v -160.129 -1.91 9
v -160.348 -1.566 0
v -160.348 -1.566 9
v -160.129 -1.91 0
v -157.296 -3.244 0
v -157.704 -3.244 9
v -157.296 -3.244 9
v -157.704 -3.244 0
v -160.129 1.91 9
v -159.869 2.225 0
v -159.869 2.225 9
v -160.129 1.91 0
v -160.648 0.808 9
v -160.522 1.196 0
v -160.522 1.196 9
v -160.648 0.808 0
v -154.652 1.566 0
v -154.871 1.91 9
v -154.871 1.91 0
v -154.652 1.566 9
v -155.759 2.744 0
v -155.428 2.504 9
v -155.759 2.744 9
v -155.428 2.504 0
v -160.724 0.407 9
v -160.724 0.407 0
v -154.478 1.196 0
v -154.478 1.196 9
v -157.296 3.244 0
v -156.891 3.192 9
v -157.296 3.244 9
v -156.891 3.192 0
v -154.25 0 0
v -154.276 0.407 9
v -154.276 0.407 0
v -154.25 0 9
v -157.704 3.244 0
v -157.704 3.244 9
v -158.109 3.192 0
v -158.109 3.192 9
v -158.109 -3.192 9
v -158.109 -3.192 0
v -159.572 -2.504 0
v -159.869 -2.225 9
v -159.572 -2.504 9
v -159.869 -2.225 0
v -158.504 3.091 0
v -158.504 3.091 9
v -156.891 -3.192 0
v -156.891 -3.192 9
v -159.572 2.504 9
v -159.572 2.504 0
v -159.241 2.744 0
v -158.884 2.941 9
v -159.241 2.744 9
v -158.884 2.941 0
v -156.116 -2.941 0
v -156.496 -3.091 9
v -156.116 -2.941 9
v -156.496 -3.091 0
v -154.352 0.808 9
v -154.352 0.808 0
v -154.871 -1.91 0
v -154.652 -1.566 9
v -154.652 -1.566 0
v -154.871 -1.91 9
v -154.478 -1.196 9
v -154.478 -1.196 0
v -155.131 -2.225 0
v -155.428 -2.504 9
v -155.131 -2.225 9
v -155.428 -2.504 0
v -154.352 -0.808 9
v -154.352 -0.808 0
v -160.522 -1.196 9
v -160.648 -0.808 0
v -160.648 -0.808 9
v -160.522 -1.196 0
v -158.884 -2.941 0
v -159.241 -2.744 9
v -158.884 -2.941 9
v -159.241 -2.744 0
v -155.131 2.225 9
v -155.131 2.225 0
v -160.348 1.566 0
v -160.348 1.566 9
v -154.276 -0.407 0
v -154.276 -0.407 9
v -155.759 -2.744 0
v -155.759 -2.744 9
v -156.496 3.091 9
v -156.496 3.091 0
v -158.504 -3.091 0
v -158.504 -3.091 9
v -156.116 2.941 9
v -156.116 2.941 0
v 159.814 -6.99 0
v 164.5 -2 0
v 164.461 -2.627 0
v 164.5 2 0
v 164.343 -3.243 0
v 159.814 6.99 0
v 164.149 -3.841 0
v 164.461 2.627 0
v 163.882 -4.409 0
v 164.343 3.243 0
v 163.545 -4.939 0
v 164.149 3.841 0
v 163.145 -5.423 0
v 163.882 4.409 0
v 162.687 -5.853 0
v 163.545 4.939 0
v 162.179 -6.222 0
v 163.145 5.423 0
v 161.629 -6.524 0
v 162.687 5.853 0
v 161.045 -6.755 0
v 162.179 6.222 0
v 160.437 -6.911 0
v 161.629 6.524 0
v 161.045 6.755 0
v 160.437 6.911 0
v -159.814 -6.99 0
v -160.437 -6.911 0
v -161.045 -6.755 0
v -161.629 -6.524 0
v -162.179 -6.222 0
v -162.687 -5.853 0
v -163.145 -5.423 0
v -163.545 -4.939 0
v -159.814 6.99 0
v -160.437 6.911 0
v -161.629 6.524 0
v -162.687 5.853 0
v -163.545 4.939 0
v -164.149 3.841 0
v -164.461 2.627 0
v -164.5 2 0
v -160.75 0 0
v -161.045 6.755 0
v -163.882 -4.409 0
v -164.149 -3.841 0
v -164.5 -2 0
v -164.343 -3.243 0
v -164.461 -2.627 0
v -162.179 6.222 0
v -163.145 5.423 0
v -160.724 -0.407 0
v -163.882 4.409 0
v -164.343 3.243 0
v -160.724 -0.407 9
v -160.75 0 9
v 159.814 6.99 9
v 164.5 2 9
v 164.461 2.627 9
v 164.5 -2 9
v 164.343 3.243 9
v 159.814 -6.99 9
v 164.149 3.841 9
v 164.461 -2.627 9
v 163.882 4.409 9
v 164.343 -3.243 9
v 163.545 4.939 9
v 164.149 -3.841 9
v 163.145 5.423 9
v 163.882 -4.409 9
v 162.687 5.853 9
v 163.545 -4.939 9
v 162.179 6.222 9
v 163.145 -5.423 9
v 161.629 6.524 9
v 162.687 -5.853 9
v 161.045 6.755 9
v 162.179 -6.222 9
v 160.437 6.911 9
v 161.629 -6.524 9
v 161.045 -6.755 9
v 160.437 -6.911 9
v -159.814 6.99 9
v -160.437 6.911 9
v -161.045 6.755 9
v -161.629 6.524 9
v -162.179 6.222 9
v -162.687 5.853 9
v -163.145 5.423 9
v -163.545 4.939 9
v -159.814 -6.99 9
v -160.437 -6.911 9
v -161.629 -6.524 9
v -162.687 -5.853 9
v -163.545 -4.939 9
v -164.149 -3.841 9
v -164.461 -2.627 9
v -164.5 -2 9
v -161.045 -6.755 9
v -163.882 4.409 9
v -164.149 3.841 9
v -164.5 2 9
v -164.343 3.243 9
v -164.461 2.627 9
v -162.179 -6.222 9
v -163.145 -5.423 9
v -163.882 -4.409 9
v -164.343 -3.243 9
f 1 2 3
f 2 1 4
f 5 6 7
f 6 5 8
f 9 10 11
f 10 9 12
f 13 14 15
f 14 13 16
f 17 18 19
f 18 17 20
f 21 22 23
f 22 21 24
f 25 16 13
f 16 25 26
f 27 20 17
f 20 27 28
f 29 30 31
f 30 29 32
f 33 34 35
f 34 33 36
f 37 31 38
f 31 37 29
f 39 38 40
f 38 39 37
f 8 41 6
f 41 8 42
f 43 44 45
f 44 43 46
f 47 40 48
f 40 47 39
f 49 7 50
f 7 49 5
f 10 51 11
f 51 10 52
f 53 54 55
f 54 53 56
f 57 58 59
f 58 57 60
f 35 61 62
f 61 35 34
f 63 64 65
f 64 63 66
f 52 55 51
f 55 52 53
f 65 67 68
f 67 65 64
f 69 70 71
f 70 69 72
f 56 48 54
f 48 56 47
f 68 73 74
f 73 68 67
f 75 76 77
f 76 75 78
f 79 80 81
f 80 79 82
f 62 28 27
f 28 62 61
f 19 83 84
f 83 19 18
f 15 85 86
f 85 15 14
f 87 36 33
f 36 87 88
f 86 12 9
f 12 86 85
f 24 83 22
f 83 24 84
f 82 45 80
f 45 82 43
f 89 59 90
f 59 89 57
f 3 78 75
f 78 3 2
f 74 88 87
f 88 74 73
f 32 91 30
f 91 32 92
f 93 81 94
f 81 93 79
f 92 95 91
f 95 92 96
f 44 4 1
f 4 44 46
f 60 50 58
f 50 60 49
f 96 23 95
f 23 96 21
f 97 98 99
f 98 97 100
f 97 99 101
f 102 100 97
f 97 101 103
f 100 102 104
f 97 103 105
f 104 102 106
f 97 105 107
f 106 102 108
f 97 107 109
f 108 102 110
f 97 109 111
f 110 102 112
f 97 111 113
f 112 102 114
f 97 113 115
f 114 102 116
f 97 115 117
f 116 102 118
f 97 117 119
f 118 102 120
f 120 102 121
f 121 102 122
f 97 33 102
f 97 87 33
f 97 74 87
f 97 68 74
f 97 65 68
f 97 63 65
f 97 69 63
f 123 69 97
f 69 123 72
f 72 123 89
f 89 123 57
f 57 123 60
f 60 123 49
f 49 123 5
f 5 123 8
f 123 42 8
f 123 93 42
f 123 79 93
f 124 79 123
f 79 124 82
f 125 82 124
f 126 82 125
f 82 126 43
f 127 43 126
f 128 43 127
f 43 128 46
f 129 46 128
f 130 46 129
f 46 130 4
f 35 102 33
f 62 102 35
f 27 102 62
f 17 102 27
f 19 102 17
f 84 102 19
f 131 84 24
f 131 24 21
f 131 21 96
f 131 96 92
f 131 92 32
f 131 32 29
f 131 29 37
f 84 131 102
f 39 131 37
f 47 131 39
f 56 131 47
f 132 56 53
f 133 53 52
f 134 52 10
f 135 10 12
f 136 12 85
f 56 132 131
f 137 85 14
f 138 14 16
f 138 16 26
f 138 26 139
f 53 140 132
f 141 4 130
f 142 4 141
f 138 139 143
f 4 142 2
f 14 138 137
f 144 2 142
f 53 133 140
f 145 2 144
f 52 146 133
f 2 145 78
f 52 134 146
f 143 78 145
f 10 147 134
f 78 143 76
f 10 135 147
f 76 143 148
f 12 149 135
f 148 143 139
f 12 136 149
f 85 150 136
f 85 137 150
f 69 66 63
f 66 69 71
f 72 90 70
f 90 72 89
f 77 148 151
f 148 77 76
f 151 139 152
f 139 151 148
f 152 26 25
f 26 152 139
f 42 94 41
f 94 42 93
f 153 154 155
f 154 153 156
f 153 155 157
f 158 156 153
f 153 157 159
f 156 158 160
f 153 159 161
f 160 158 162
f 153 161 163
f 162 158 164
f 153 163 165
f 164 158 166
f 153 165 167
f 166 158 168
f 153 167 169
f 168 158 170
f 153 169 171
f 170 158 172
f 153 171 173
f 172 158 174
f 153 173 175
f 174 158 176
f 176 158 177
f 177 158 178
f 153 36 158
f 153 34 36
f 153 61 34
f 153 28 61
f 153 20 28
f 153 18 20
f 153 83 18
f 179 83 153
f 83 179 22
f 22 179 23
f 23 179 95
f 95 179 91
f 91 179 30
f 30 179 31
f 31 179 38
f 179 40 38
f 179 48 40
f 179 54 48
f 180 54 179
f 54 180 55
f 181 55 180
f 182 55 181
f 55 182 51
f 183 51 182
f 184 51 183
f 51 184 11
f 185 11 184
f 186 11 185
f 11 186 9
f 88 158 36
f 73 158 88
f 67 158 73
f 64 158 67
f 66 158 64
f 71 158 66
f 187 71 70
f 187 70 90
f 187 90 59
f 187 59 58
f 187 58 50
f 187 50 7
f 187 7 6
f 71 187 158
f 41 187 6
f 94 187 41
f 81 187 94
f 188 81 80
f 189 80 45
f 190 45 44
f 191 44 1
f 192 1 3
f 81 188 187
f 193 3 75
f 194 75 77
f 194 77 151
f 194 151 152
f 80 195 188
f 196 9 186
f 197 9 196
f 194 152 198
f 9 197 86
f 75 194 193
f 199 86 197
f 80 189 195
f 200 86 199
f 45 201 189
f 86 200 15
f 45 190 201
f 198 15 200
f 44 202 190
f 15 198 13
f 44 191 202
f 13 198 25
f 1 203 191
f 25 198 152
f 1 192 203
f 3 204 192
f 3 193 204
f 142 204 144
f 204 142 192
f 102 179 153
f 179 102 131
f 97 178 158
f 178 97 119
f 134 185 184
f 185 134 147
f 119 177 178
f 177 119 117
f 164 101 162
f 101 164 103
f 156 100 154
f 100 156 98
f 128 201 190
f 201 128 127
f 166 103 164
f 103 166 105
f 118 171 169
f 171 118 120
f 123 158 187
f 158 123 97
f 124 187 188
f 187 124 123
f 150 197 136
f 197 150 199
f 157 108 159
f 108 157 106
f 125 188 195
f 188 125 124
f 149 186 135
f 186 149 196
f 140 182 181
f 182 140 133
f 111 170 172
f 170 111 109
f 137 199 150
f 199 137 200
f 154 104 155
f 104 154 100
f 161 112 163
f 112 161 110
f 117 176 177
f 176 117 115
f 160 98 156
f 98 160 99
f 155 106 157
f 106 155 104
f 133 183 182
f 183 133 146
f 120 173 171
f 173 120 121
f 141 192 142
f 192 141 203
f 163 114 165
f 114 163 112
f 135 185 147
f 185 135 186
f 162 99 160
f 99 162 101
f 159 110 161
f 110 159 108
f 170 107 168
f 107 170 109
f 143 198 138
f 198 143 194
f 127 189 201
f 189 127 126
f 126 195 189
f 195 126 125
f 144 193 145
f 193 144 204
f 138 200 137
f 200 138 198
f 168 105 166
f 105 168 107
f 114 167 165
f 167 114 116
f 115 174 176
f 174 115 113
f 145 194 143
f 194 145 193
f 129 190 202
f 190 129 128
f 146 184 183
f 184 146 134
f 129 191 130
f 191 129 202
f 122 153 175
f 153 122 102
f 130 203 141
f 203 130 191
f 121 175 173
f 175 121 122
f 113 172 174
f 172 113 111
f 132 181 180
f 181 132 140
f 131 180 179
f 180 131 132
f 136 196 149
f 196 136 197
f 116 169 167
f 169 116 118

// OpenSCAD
$fn = 50;


difference() {
	union() {
		hull() {
			translate(v = [-159.5000000000, 2.0000000000, 0]) {
				cylinder(h = 9, r = 5);
			}
			translate(v = [159.5000000000, 2.0000000000, 0]) {
				cylinder(h = 9, r = 5);
			}
			translate(v = [-159.5000000000, -2.0000000000, 0]) {
				cylinder(h = 9, r = 5);
			}
			translate(v = [159.5000000000, -2.0000000000, 0]) {
				cylinder(h = 9, r = 5);
			}
		}
	}
	union() {
		translate(v = [-157.5000000000, 0.0000000000, 0]) {
			cylinder(h = 9, r = 3.2500000000);
		}
		translate(v = [-157.5000000000, 0.0000000000, 0]) {
			cylinder(h = 9, r = 1.8000000000);
		}
		translate(v = [-157.5000000000, 0.0000000000, 0]) {
			cylinder(h = 9, r = 1.8000000000);
		}
		translate(v = [-157.5000000000, 0.0000000000, 0]) {
			cylinder(h = 9, r = 1.8000000000);
		}
	}
}
